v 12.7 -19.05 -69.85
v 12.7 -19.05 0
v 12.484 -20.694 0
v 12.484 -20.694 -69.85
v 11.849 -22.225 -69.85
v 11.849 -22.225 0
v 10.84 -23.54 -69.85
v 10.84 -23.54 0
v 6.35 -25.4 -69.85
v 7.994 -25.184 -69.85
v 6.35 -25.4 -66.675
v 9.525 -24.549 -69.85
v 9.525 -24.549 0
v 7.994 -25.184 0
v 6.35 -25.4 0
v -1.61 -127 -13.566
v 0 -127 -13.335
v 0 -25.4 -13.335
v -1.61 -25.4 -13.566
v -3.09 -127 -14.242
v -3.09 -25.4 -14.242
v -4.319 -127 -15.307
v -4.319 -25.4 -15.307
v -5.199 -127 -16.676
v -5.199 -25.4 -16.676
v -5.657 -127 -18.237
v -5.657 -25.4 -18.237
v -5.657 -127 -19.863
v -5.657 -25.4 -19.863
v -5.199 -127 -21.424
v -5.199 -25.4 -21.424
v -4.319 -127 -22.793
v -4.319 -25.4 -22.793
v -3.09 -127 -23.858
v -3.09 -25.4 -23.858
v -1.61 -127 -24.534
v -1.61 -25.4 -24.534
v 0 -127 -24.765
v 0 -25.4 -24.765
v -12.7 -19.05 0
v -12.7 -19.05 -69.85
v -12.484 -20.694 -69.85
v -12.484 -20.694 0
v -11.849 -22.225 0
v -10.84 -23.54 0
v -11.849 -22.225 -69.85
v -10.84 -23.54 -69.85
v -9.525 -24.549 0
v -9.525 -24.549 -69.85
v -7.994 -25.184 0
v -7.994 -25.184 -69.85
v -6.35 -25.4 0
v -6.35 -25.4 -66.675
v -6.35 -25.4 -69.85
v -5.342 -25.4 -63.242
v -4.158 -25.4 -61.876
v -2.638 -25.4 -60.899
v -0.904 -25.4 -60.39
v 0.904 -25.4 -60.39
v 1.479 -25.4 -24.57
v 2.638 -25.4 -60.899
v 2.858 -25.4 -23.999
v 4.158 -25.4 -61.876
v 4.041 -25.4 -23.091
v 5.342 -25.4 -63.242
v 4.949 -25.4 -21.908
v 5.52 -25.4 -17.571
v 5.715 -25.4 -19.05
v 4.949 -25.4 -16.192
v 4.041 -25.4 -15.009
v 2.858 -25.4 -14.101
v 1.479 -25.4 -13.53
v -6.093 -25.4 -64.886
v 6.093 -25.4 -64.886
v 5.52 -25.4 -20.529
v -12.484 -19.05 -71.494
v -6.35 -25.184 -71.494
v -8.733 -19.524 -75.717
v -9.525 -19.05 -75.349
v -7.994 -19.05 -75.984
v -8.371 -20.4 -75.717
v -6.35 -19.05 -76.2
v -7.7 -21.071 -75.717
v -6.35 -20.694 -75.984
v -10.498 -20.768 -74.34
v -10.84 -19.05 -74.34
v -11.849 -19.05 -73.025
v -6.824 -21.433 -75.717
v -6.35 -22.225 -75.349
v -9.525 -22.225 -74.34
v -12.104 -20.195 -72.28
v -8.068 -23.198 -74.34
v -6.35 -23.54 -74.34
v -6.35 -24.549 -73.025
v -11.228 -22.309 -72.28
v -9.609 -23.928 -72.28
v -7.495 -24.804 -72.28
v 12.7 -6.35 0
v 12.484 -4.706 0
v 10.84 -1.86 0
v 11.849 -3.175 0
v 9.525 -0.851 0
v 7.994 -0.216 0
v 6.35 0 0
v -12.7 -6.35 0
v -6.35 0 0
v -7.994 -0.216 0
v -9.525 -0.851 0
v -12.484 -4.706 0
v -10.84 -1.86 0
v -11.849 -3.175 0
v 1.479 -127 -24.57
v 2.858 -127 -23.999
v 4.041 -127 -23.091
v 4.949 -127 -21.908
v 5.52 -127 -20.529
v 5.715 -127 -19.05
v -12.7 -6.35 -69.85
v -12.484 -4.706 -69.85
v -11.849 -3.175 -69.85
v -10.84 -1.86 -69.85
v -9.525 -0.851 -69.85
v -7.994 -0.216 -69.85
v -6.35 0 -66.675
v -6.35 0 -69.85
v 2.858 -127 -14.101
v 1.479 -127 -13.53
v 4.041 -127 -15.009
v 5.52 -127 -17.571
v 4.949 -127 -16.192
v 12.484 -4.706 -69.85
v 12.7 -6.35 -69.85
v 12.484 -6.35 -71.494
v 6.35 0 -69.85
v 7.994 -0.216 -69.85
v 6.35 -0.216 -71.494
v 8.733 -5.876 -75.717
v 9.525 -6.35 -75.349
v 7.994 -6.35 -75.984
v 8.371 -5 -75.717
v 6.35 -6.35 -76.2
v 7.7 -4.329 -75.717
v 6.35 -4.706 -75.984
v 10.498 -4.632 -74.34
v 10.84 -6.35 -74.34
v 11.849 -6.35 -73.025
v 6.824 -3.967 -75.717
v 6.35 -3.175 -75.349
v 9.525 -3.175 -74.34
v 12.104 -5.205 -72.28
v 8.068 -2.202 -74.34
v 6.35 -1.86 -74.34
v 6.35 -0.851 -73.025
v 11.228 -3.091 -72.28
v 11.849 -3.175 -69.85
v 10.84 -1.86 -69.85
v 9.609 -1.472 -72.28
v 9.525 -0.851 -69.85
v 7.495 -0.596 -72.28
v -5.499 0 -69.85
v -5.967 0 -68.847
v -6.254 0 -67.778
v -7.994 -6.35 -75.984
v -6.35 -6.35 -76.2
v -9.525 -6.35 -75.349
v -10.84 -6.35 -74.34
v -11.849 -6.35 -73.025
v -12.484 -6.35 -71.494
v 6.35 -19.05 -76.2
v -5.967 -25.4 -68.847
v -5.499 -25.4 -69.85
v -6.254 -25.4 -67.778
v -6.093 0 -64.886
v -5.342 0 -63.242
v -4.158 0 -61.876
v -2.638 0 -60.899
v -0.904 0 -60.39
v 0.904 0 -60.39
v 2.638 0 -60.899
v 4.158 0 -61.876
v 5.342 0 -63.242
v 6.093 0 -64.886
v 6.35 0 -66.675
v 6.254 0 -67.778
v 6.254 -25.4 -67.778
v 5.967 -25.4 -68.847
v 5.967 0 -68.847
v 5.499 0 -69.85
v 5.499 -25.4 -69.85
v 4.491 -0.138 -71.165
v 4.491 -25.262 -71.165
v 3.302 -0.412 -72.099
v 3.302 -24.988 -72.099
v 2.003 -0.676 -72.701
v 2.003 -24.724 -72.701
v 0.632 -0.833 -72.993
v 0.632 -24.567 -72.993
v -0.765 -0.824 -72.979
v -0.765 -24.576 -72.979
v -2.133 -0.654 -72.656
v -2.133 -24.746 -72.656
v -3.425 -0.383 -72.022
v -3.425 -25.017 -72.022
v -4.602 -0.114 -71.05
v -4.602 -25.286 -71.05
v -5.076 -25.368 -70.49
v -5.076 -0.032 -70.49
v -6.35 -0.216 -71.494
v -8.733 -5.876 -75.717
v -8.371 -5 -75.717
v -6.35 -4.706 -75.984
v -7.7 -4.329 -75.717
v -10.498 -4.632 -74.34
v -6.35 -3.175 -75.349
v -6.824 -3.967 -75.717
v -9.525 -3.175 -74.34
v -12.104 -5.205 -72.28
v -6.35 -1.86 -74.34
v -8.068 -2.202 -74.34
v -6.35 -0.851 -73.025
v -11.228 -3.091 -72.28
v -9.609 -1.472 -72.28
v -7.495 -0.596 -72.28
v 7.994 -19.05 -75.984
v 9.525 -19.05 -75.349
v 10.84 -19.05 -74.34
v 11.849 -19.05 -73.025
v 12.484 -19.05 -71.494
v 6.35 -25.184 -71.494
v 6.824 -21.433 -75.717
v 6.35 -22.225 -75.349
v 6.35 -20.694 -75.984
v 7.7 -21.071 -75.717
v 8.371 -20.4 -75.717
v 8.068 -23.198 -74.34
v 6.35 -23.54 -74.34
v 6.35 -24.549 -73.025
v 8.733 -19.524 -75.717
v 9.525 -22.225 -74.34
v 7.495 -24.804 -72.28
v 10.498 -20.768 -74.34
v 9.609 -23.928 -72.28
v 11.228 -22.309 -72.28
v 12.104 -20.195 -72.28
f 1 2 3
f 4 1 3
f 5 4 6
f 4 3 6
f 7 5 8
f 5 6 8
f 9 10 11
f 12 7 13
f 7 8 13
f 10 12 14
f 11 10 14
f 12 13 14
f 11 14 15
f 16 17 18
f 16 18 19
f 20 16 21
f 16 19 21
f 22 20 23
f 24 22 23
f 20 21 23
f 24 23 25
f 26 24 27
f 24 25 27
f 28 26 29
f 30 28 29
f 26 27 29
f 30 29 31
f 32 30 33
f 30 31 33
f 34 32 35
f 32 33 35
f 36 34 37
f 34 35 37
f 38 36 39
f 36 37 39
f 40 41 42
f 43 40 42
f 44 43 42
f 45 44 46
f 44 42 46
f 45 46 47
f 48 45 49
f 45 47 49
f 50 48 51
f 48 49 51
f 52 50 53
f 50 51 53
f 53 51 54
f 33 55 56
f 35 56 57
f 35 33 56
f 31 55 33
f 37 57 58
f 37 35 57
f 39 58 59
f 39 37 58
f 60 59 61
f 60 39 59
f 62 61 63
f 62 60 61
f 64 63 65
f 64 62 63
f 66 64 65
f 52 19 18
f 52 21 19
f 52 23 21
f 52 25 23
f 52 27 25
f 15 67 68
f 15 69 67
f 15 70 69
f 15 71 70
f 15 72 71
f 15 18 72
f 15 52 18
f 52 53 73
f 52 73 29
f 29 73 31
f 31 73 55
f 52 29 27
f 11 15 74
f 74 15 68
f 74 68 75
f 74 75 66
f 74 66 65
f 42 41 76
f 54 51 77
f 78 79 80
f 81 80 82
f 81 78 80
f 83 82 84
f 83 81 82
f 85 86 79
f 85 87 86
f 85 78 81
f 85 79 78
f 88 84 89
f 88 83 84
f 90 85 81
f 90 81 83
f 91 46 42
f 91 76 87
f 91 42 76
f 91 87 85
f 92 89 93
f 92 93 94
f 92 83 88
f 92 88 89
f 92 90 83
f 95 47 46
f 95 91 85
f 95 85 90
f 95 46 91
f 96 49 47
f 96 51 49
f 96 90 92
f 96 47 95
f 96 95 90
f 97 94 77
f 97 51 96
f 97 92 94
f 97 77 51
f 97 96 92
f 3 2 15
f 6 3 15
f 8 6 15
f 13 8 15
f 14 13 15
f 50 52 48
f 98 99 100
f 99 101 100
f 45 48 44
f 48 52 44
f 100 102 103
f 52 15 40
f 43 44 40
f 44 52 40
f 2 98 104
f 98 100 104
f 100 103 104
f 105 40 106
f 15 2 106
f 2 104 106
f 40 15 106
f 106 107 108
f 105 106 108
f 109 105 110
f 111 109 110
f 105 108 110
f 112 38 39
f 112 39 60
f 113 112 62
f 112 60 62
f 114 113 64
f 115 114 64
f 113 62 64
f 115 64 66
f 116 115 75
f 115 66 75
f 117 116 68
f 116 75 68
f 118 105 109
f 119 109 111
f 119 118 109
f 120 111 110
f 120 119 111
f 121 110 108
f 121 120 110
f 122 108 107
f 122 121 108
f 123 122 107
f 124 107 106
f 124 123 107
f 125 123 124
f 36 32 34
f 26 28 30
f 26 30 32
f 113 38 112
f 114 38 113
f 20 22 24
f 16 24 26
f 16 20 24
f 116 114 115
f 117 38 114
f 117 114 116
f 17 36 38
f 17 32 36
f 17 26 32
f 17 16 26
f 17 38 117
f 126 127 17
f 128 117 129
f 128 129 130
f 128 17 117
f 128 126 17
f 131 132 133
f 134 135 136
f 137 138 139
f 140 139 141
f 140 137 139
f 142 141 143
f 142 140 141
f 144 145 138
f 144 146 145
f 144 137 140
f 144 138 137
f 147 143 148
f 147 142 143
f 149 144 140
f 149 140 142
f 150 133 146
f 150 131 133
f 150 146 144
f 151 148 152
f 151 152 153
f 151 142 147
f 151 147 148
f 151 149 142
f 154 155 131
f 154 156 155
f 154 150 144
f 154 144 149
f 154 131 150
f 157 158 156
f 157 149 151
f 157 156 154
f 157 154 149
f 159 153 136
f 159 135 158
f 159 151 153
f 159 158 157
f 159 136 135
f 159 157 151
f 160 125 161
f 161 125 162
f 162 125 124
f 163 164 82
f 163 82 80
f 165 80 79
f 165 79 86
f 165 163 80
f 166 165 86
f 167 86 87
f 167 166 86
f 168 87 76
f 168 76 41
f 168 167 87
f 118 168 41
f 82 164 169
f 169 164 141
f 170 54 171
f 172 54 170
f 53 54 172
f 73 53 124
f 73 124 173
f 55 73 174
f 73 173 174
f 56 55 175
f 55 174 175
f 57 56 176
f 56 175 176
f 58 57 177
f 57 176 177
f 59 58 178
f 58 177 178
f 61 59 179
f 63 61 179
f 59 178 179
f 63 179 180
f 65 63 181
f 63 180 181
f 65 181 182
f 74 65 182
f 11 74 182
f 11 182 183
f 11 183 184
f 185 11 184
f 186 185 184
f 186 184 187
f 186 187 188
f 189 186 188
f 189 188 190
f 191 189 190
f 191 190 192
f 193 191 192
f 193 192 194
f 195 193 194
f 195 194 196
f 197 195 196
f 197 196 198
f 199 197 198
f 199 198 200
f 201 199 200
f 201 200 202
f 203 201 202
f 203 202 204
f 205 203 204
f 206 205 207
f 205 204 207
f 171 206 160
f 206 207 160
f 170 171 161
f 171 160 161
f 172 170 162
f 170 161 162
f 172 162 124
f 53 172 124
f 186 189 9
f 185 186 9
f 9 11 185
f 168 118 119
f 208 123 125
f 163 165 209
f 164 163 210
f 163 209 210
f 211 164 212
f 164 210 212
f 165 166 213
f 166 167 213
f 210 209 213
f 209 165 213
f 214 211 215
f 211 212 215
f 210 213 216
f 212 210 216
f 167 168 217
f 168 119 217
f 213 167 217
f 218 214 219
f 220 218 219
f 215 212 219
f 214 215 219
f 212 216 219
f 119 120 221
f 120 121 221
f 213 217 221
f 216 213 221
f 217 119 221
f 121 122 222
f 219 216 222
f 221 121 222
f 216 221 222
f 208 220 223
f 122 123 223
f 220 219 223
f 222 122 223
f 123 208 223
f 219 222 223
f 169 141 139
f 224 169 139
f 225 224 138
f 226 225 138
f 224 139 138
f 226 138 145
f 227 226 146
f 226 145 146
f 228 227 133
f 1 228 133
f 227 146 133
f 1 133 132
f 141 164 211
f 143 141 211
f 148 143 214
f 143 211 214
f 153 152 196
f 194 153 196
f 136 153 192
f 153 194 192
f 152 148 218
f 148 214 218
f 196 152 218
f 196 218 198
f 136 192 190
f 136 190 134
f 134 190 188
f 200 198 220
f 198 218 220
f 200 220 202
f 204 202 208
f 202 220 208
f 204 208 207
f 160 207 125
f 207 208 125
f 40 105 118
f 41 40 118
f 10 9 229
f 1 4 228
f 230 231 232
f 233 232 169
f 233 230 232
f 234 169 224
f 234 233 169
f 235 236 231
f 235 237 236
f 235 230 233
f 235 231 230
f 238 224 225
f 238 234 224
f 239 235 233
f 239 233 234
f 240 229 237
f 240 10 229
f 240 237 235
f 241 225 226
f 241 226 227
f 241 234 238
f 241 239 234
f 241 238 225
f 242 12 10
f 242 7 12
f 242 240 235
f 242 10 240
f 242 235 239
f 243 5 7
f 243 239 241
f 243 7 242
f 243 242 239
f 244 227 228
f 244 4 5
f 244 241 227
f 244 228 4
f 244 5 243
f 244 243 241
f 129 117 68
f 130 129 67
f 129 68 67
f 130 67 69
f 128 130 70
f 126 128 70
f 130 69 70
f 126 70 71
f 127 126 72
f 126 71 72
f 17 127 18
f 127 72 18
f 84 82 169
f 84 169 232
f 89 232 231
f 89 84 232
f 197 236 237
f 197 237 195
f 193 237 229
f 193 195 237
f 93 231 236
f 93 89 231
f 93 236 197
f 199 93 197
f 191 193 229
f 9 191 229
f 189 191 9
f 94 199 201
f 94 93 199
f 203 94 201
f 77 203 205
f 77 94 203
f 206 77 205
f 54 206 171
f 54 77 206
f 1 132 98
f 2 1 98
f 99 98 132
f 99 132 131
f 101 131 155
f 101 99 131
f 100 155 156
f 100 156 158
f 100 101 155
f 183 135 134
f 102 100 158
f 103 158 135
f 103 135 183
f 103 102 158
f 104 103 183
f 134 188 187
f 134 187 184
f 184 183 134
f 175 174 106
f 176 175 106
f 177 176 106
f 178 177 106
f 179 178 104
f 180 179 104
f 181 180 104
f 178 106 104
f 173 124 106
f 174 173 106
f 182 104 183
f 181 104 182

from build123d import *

# Parameters (mm, degrees)
F1_DEPTH     = 25.4
F3_DEPTH     = 101.6
F4_R         = 6.35
F6_D         = 12.7
F6_DEPTH     = 254
F6_TIP       = 3.8154649308
F7_T1_DEPTH  = 12.7
F7_T3_DEPTH  = 12.7
F7_T6_ANGLE  = 90
F7_T8_ANGLE  = 90
F7_T10_ANGLE = 90
F7_T12_ANGLE = 90


# Not quite as in the source:
# - a fillet or chamfer that OpenCascade refuses, or shapes differently, is made with other operations: its cross-section is extruded or revolved along the edge and cut away or added


with BuildPart() as f1:
    # F0 (on Front) → F1 (new body)
    with BuildSketch(Plane.XZ):
        Polygon((-12.7, -76.2), (0, -76.2), (12.7, -76.2), (12.7, 0), (-12.7, 0), align=None)
    extrude(amount=F1_DEPTH)

    # F2 (on face) → F3 (join)
    with BuildSketch(Plane.XZ.offset(25.4)):
        with BuildLine():
            ThreePointArc((5.715, -19.05), (4.0411152545, -15.0088847455), (0, -13.335))
            Line((0, -13.335), (0, -19.05))
            Line((0, -19.05), (0, -24.765))
            ThreePointArc((0, -24.765), (4.0411152545, -23.0911152545), (5.715, -19.05))
        make_face()
        with BuildLine():
            Line((0, -19.05), (0, -13.335))
            ThreePointArc((0, -13.335), (-5.715, -19.05), (0, -24.765))
            Line((0, -24.765), (0, -19.05))
        make_face()
    extrude(amount=F3_DEPTH)

    # F4
    f4_edges = [f1.edges().sort_by_distance(p)[0] for p in [
        (12.7, -25.4, -38.1),
        (12.7, 0, -38.1),
        (-12.7, -25.4, -38.1),
        (-12.7, 0, -38.1),
    ]]
    fillet(f4_edges, radius=F4_R)

    # F6
    with Locations(Plane.XZ.offset(25.4)):
        with Locations((0, -66.675)):
            Hole(F6_D / 2, depth=F6_DEPTH)
            with Locations((0, 0, -(F6_DEPTH + F6_TIP / 2))):  # 118° drill point
                Cone(0, F6_D / 2, F6_TIP, mode=Mode.SUBTRACT)

    # F7: fillet of radius 6.35 on 6 edges, made by hand

    # F7_s2 → F7_t1 (cut)
    with BuildSketch(Plane.XZ.offset(6.35)):
        with BuildLine():
            ThreePointArc((6.35, -76.2), (10.8401280605, -74.3401280605), (12.7, -69.85))
            Line((12.7, -69.85), (12.7, -76.2))
            Line((12.7, -76.2), (6.35, -76.2))
        make_face()
        with BuildLine():
            ThreePointArc((-6.35, -76.2), (-10.8401280605, -74.3401280605), (-12.7, -69.85))
            Line((-12.7, -69.85), (-12.7, -76.2))
            Line((-12.7, -76.2), (-6.35, -76.2))
        make_face()
    extrude(amount=F7_T1_DEPTH, mode=Mode.SUBTRACT)

    # F7_s4 → F7_t3 (cut)
    with BuildSketch(Plane.YZ.offset(-6.35)):
        with BuildLine():
            ThreePointArc((-19.05, -76.2), (-23.5401280605, -74.3401280605), (-25.4, -69.85))
            Line((-25.4, -69.85), (-25.4, -76.2))
            Line((-25.4, -76.2), (-19.05, -76.2))
        make_face()
        with BuildLine():
            ThreePointArc((-6.35, -76.2), (-1.8598719395, -74.3401280605), (0, -69.85))
            Line((0, -69.85), (0, -76.2))
            Line((0, -76.2), (-6.35, -76.2))
        make_face()
    extrude(amount=F7_T3_DEPTH, mode=Mode.SUBTRACT)

    # F7_s5 → F7_t6 (revolve, cut)
    with BuildSketch(Plane.XZ.offset(6.35)):
        with BuildLine():
            ThreePointArc((-6.35, -76.2), (-10.8401280605, -74.3401280605), (-12.7, -69.85))
            Line((-12.7, -69.85), (-12.7, -76.2))
            Line((-12.7, -76.2), (-6.35, -76.2))
        make_face()
    revolve(axis=Axis((-6.35, -6.35, -76.2), (0, 0, -1)), revolution_arc=F7_T6_ANGLE, mode=Mode.SUBTRACT)

    # F7_s7 → F7_t8 (revolve, cut)
    with BuildSketch(Plane.XZ.offset(19.05)):
        with BuildLine():
            ThreePointArc((-6.35, -76.2), (-10.8401280605, -74.3401280605), (-12.7, -69.85))
            Line((-12.7, -69.85), (-12.7, -76.2))
            Line((-12.7, -76.2), (-6.35, -76.2))
        make_face()
    revolve(axis=Axis((-6.35, -19.05, -76.2), (0, 0, 1)), revolution_arc=F7_T8_ANGLE, mode=Mode.SUBTRACT)

    # F7_s9 → F7_t10 (revolve, cut)
    with BuildSketch(Plane.XZ.offset(6.35)):
        with BuildLine():
            ThreePointArc((6.35, -76.2), (10.8401280605, -74.3401280605), (12.7, -69.85))
            Line((12.7, -69.85), (12.7, -76.2))
            Line((12.7, -76.2), (6.35, -76.2))
        make_face()
    revolve(axis=Axis((6.35, -6.35, -76.2), (0, 0, 1)), revolution_arc=F7_T10_ANGLE, mode=Mode.SUBTRACT)

    # F7_s11 → F7_t12 (revolve, cut)
    with BuildSketch(Plane.YZ.offset(6.35)):
        with BuildLine():
            ThreePointArc((-19.05, -76.2), (-23.5401280605, -74.3401280605), (-25.4, -69.85))
            Line((-25.4, -69.85), (-25.4, -76.2))
            Line((-25.4, -76.2), (-19.05, -76.2))
        make_face()
    revolve(axis=Axis((6.35, -19.05, -76.2), (0, 0, 1)), revolution_arc=F7_T12_ANGLE, mode=Mode.SUBTRACT)


solid = f1.part
